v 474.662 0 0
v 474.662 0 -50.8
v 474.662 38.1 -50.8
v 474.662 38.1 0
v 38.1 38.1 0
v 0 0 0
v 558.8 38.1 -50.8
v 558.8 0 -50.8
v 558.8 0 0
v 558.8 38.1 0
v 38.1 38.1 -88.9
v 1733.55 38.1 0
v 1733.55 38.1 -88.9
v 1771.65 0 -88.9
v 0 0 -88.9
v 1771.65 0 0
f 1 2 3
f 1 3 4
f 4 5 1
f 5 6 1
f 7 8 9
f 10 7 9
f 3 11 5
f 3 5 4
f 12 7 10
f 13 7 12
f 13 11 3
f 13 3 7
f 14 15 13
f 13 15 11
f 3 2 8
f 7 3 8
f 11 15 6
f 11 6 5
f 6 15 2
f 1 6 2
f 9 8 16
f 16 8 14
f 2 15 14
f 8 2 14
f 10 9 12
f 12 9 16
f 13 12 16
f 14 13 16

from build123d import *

# Parameters (mm, degrees)
SKETCH1_W           = 1771.65
SKETCH1_H           = 88.9
BOSS_EXTRUDE1_DEPTH = 38.1
CUT_EXTRUDE1_DEPTH  = 89.9
SKETCH3_W           = 84.1375
SKETCH3_H           = 50.8
CUT_EXTRUDE2_DEPTH  = 39.1


with BuildPart() as part:
    # Sketch1 → Boss-Extrude1 (new body)
    with BuildSketch(Plane(origin=(0, 0, 0), x_dir=(1, 0, 0), z_dir=(0, 1, 0))):
        with Locations((885.825, 44.45)):
            Rectangle(SKETCH1_W, SKETCH1_H)
    extrude(amount=BOSS_EXTRUDE1_DEPTH)

    # Sketch2 → Cut-Extrude1 (cut, through all)
    with BuildSketch(Plane.XY):
        Polygon((0, 0), (38.1, 38.1), (0, 38.1), align=None)
        Polygon((1771.65, 0), (1771.65, 38.1), (1733.55, 38.1), align=None)
    extrude(amount=-CUT_EXTRUDE1_DEPTH, mode=Mode.SUBTRACT)

    # Sketch3 → Cut-Extrude2 (cut, through all)
    with BuildSketch(Plane.XZ):
        with Locations((516.73125, -25.4)):
            Rectangle(SKETCH3_W, SKETCH3_H)
    extrude(amount=-CUT_EXTRUDE2_DEPTH, mode=Mode.SUBTRACT)


solid = part.part
